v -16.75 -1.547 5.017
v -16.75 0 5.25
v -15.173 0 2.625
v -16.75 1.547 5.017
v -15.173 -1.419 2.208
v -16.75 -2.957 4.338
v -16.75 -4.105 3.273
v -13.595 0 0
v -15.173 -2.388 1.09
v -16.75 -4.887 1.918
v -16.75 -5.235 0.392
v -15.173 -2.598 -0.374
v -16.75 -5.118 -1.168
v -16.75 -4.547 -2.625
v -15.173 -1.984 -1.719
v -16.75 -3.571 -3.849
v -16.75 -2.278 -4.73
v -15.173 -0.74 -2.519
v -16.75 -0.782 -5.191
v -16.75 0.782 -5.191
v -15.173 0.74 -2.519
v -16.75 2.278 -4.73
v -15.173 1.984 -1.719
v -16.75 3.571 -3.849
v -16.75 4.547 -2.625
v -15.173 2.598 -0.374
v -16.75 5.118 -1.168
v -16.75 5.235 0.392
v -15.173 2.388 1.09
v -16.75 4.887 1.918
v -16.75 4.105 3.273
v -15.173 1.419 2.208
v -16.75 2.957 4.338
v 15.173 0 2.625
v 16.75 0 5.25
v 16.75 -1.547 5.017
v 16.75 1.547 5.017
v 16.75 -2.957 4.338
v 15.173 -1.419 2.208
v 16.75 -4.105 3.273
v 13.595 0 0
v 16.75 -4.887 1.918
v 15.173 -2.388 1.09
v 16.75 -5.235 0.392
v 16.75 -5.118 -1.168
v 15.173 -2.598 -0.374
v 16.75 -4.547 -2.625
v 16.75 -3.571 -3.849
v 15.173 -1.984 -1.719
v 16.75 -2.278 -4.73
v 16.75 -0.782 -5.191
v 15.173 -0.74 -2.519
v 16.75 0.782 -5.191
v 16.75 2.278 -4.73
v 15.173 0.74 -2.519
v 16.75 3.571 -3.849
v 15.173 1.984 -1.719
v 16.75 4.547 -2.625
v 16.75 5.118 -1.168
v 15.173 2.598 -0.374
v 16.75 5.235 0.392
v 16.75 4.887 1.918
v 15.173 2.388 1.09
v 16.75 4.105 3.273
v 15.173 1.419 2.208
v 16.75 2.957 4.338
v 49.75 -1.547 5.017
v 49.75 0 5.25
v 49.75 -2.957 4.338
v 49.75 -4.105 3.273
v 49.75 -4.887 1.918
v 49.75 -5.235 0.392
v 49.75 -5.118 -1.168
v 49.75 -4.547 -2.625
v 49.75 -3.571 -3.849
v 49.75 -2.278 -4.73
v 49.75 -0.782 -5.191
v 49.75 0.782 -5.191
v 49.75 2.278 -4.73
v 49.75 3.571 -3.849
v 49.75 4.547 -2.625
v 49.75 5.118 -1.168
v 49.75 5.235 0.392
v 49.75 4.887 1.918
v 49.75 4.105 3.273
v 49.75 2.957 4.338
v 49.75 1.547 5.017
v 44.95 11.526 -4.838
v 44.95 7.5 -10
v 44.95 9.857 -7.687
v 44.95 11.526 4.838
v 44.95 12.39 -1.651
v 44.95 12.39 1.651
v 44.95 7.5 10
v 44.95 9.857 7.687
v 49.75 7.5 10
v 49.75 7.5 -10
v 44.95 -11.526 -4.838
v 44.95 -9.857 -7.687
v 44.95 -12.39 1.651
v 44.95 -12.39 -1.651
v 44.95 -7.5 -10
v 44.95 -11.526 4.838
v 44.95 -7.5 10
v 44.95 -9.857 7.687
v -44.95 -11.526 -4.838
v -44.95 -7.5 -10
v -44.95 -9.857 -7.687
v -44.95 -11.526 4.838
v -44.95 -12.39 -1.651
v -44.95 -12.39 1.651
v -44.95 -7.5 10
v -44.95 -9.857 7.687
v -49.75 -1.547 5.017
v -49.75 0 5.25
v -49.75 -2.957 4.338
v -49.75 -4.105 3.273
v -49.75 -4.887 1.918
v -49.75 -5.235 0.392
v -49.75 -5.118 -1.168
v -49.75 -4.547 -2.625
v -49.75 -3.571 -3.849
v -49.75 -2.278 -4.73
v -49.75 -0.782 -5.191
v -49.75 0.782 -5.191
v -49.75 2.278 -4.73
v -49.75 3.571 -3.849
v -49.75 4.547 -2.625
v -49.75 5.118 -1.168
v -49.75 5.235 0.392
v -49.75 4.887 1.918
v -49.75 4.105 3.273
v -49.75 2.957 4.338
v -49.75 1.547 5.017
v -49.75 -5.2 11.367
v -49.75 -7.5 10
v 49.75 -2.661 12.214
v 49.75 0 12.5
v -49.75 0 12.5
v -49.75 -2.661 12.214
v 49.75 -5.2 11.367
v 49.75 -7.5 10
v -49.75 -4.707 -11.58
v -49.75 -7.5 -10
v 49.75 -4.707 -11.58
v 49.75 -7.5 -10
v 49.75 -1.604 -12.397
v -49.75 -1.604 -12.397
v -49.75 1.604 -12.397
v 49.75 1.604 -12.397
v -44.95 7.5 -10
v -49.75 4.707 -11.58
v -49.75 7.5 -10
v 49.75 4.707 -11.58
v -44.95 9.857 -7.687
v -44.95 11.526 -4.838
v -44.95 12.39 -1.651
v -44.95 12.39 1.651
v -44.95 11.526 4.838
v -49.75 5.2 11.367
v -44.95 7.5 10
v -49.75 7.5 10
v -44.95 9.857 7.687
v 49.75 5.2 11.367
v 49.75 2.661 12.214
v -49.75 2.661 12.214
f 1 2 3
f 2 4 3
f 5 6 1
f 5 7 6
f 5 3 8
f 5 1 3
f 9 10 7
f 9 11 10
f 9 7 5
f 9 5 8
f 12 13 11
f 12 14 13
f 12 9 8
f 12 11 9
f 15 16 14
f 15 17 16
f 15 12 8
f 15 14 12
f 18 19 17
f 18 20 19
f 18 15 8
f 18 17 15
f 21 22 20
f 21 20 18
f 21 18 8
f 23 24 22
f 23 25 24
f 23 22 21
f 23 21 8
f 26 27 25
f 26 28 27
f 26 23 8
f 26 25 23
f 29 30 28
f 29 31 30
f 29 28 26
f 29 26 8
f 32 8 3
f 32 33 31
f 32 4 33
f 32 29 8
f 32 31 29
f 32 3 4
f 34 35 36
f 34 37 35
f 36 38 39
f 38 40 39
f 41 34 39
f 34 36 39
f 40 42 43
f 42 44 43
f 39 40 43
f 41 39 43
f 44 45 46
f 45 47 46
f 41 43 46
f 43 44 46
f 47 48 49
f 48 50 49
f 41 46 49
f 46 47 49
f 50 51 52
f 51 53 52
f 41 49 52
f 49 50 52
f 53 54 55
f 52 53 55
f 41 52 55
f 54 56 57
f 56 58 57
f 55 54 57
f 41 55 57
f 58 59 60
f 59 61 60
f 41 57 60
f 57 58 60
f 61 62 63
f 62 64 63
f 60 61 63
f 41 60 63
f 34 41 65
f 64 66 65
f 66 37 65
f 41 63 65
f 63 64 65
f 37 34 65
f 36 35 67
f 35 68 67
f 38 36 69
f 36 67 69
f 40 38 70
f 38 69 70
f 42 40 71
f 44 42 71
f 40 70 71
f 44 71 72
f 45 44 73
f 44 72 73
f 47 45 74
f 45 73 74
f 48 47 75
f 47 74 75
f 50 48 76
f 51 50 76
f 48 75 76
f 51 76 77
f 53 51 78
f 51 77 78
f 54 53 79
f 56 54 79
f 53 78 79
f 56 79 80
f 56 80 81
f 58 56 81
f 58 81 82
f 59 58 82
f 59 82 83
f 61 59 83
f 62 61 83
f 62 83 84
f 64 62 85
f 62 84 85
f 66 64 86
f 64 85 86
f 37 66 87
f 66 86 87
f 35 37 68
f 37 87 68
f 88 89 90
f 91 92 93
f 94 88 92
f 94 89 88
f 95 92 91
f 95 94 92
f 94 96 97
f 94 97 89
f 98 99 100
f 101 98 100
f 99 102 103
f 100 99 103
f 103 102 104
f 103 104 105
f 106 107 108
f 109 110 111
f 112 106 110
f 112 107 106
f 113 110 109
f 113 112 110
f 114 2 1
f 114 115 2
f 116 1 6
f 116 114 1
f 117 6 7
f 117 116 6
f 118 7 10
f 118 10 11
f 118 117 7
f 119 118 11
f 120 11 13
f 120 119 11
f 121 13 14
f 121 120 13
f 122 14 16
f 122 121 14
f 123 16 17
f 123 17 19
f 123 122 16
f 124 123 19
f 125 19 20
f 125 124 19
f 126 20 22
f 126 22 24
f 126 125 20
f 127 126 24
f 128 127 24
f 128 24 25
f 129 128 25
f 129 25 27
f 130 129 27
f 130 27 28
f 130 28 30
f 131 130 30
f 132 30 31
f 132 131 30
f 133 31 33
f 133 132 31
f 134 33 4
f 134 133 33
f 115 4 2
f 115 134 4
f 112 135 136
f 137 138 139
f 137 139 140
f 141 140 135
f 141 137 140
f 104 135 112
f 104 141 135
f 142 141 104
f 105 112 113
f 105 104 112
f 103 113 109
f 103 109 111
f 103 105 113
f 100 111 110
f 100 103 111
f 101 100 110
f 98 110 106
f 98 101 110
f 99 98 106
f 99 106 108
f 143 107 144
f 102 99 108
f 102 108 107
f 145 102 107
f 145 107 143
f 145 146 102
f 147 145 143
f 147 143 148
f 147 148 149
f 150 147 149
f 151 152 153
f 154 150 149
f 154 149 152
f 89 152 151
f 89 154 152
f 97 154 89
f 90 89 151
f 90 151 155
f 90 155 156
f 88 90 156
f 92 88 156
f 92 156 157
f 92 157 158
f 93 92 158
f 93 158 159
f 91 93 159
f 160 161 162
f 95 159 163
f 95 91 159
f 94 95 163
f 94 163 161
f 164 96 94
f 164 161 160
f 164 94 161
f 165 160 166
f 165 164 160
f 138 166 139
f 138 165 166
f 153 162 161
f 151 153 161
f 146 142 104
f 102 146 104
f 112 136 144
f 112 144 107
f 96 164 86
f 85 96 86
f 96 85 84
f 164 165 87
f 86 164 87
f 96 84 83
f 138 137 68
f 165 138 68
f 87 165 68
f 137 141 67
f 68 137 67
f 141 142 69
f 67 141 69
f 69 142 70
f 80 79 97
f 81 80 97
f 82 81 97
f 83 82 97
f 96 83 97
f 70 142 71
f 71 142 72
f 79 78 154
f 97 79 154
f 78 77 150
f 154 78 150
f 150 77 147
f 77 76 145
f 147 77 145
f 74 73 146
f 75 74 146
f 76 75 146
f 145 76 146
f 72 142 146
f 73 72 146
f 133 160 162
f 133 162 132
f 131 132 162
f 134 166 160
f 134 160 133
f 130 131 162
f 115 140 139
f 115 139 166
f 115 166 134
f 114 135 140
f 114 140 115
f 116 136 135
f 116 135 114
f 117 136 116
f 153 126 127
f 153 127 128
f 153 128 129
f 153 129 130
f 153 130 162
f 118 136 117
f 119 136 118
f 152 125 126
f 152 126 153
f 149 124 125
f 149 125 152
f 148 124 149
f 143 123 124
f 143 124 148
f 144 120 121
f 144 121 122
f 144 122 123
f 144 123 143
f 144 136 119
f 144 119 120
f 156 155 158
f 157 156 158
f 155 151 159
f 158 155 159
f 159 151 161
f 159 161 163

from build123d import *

# Parameters (mm, degrees)
ESQUISSE1_W               = 99.5
ESQUISSE1_H               = 12.5
ESQUISSE2_W               = 4.8
ESQUISSE2_H               = 5
ENL_V_MAT_EXTRU_1_DEPTH   = 13.5
SYM_TRIE2_COPY_1_SKETCH_W = 4.8
SYM_TRIE2_COPY_1_SKETCH_H = 5
SYM_TRIE2_COPY_1_DEPTH    = 13.5


with BuildPart() as part:
    # Esquisse1 → Révolution1 (revolve)
    with BuildSketch(Plane.XY, mode=Mode.PRIVATE) as r_volution1_sk:
        with Locations((0, 6.25)):
            Rectangle(ESQUISSE1_W, ESQUISSE1_H)
    revolve(r_volution1_sk.sketch.rotate(Axis((-69.457729469, 0, 0), (1, 0, 0)), 90), axis=Axis((-69.457729469, 0, 0), (1, 0, 0)))  # turned: the seam where the file's is

    # Esquisse2 → Enlèv. mat.-Extru.1 (cut, symmetric)
    with BuildSketch(Plane.XY):
        with Locations((-47.35, 10)):
            Rectangle(ESQUISSE2_W, ESQUISSE2_H)
    enl_v_mat_extru_1 = extrude(amount=ENL_V_MAT_EXTRU_1_DEPTH, both=True, mode=Mode.SUBTRACT)

    # Symétrie1: Enlèv. mat.-Extru.1 across plane
    add(enl_v_mat_extru_1.mirror(Plane.ZX), mode=Mode.SUBTRACT)

    # Esquisse5 → Diamètre du perçage Ø10.5 (10.5)1 (revolve, cut)
    with BuildSketch(Plane(origin=(-49.75, 0, 0), x_dir=(0, 0, 1), z_dir=(0, 1, 0))):
        Polygon((0, 0), (0, 36.15451825), (5.25, 33), (5.25, 0), align=None)
    diam_tre_du_per_age_10_5_10_5_1 = revolve(axis=Axis((-56.1, 0, 0), (1, 0, 0)), mode=Mode.SUBTRACT)

    # Symétrie2: Diamètre du perçage Ø10.5 (10.5)1, Enlèv. mat.-Extru.1 across plane
    add(diam_tre_du_per_age_10_5_10_5_1.mirror(Plane(origin=(0, 0, 0), x_dir=(0, 0, 1), z_dir=(1, 0, 0))), mode=Mode.SUBTRACT)
    add(enl_v_mat_extru_1.mirror(Plane(origin=(0, 0, 0), x_dir=(0, 0, 1), z_dir=(1, 0, 0))), mode=Mode.SUBTRACT)

    # Symétrie2 copy 1 sketch → Symétrie2 copy 1 (cut, symmetric)
    with BuildSketch(Plane(origin=(0, 0, 0), x_dir=(-1, 0, 0), z_dir=(0, 0, 1))):
        with Locations((-47.35, 10)):
            Rectangle(SYM_TRIE2_COPY_1_SKETCH_W, SYM_TRIE2_COPY_1_SKETCH_H)
    extrude(amount=SYM_TRIE2_COPY_1_DEPTH, both=True, mode=Mode.SUBTRACT)


solid = part.part
